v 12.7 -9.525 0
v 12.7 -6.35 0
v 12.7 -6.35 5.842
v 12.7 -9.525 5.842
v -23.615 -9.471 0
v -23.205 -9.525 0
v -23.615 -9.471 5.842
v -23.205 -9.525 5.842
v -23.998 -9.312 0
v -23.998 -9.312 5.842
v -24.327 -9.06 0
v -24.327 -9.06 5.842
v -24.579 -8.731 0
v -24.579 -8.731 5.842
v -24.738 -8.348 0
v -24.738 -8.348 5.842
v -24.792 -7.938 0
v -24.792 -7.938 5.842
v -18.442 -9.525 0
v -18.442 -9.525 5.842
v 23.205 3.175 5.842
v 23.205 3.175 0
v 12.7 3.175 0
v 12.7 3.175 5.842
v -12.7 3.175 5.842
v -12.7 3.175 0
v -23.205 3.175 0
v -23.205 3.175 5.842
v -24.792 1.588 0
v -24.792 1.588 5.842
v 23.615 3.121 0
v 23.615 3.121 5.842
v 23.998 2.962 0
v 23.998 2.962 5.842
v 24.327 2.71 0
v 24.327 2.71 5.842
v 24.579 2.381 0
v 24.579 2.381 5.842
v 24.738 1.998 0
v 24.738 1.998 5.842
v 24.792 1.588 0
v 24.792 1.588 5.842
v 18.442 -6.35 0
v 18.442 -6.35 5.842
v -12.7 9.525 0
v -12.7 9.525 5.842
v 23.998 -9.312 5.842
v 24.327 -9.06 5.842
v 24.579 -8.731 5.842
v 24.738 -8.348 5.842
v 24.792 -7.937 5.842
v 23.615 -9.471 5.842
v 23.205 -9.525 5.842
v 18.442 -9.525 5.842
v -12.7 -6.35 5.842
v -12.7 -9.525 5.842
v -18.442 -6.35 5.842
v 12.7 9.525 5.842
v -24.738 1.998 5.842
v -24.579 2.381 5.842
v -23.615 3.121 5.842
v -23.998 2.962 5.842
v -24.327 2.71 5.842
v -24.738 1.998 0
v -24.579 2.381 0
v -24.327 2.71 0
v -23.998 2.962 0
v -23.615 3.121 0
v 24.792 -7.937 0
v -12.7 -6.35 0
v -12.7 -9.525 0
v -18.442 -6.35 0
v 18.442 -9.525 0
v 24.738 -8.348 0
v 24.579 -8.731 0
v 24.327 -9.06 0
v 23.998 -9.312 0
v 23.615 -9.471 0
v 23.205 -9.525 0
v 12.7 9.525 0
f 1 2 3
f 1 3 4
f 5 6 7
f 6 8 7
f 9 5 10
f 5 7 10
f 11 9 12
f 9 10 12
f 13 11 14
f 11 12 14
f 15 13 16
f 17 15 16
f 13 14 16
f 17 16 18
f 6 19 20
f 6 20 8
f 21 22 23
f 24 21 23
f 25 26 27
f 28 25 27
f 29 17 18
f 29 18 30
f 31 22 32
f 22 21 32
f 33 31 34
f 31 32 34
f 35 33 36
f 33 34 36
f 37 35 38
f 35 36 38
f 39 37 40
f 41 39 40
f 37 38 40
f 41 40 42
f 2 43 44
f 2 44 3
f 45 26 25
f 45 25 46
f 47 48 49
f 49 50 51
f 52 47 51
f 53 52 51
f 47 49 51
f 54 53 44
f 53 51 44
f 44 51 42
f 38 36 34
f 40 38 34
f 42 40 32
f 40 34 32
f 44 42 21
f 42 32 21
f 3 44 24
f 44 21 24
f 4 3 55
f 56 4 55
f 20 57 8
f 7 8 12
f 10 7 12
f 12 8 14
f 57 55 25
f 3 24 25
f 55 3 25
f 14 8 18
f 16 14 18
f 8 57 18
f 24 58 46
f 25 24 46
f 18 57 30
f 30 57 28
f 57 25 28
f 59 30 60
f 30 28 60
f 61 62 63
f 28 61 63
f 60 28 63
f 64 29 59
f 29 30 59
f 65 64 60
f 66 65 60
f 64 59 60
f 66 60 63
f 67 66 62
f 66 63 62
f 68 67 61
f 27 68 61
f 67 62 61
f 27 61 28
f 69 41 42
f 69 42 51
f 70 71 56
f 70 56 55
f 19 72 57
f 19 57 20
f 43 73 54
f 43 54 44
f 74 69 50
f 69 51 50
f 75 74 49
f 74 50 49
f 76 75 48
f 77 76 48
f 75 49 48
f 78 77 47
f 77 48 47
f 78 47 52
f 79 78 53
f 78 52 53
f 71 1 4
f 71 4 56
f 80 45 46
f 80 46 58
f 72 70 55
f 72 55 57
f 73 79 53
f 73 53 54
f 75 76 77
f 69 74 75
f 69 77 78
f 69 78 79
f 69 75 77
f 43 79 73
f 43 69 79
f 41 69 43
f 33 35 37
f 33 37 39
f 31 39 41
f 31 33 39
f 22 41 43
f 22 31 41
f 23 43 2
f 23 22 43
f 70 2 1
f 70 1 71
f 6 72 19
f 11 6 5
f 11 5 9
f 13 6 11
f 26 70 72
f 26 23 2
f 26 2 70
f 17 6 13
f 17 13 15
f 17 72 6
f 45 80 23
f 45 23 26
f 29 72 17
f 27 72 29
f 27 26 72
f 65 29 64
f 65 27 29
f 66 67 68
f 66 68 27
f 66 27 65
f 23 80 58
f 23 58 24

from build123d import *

# Parameters (mm, degrees)
BOSS_EXTRUDE1_DEPTH = 5.842
FILLET1_R           = 1.5875


with BuildPart() as part:
    # Sketch1 → Boss-Extrude1 (new body)
    with BuildSketch(Plane.XY):
        Polygon((12.7, -9.525), (-12.7, -9.525), (-12.7, -6.35), (-18.442, -6.35), (-18.442, -9.525), (-24.792, -9.525), (-24.792, 3.175), (-18.442, 3.175), (-12.7, 3.175), (-12.7, 9.525), (12.7, 9.525), (12.7, 3.175), (18.442, 3.175), (24.792, 3.175), (24.792, -9.525), (18.442, -9.525), (18.442, -6.35), (12.7, -6.35), align=None)
    extrude(amount=BOSS_EXTRUDE1_DEPTH)

    # Fillet1
    fillet1_edges = [part.edges().sort_by_distance(p)[0] for p in [
        (24.792, 3.175, 2.921),
        (24.792, -9.525, 2.921),
        (-24.792, -9.525, 2.921),
        (-24.792, 3.175, 2.921),
    ]]
    fillet(fillet1_edges, radius=FILLET1_R)


solid = part.part
